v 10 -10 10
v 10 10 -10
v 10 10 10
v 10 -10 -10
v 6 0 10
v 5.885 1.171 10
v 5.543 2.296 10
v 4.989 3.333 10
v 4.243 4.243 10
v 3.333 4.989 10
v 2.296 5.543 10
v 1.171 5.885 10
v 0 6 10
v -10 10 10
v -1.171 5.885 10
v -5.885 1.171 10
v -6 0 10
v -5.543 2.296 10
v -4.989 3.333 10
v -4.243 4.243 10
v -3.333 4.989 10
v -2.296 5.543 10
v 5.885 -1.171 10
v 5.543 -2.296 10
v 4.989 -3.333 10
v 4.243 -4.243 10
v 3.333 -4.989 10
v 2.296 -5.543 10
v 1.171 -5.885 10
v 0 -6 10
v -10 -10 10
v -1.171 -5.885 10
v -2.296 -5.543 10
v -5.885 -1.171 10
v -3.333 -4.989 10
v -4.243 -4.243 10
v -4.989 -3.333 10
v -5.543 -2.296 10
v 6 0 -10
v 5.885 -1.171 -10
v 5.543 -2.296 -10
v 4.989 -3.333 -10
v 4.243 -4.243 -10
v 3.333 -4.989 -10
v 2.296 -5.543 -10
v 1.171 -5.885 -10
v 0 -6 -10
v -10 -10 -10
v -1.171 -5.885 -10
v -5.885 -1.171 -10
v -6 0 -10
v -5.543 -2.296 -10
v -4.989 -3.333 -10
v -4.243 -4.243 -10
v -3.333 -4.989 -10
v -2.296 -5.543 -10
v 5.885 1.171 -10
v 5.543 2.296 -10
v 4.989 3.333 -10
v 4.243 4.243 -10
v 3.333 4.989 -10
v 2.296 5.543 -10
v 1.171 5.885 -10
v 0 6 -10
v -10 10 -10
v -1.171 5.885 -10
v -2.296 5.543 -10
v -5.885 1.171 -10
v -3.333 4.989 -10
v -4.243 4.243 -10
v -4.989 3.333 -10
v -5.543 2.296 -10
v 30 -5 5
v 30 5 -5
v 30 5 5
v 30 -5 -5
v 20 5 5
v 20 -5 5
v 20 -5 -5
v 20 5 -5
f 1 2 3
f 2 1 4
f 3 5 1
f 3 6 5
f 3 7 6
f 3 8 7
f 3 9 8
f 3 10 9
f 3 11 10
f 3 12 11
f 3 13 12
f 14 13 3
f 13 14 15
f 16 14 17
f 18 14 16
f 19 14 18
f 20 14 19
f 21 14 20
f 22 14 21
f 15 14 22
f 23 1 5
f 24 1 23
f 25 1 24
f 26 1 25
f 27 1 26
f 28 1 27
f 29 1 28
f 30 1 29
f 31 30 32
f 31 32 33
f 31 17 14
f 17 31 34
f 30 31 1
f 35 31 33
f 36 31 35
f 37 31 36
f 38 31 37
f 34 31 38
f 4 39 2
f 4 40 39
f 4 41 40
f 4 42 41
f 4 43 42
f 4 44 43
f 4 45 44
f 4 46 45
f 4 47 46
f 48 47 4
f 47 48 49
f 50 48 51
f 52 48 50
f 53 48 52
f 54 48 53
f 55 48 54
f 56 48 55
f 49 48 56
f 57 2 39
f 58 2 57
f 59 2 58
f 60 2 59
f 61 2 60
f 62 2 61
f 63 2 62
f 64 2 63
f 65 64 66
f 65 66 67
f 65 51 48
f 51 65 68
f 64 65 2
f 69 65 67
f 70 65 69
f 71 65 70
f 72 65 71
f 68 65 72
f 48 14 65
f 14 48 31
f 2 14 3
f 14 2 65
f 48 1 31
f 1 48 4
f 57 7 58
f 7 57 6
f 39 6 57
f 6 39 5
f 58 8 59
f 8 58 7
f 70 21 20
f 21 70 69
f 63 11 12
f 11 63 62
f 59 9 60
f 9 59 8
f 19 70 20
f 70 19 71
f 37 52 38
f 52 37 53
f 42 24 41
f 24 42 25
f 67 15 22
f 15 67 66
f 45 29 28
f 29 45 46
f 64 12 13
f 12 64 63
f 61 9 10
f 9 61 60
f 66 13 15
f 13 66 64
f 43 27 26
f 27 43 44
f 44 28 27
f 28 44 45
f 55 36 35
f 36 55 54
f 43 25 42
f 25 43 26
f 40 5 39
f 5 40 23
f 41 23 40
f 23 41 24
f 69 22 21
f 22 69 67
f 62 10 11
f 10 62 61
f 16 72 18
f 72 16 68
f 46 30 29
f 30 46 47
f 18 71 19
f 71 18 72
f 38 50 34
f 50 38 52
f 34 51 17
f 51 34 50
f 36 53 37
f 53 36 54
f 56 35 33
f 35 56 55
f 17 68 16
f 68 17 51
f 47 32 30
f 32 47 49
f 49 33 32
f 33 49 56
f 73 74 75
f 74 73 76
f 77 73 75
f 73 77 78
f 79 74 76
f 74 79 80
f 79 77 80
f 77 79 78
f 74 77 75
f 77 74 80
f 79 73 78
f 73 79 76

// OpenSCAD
// A cutout face (the inside of the hole) plus plain default faces, and one explicitly
// colored child, so a render exercises all three color paths at once.
difference() {
  cube(20, center = true);
  cylinder(h = 40, r = 6, center = true, $fn = 32);
}
translate([25, 0, 0]) color("red") cube(10, center = true);
